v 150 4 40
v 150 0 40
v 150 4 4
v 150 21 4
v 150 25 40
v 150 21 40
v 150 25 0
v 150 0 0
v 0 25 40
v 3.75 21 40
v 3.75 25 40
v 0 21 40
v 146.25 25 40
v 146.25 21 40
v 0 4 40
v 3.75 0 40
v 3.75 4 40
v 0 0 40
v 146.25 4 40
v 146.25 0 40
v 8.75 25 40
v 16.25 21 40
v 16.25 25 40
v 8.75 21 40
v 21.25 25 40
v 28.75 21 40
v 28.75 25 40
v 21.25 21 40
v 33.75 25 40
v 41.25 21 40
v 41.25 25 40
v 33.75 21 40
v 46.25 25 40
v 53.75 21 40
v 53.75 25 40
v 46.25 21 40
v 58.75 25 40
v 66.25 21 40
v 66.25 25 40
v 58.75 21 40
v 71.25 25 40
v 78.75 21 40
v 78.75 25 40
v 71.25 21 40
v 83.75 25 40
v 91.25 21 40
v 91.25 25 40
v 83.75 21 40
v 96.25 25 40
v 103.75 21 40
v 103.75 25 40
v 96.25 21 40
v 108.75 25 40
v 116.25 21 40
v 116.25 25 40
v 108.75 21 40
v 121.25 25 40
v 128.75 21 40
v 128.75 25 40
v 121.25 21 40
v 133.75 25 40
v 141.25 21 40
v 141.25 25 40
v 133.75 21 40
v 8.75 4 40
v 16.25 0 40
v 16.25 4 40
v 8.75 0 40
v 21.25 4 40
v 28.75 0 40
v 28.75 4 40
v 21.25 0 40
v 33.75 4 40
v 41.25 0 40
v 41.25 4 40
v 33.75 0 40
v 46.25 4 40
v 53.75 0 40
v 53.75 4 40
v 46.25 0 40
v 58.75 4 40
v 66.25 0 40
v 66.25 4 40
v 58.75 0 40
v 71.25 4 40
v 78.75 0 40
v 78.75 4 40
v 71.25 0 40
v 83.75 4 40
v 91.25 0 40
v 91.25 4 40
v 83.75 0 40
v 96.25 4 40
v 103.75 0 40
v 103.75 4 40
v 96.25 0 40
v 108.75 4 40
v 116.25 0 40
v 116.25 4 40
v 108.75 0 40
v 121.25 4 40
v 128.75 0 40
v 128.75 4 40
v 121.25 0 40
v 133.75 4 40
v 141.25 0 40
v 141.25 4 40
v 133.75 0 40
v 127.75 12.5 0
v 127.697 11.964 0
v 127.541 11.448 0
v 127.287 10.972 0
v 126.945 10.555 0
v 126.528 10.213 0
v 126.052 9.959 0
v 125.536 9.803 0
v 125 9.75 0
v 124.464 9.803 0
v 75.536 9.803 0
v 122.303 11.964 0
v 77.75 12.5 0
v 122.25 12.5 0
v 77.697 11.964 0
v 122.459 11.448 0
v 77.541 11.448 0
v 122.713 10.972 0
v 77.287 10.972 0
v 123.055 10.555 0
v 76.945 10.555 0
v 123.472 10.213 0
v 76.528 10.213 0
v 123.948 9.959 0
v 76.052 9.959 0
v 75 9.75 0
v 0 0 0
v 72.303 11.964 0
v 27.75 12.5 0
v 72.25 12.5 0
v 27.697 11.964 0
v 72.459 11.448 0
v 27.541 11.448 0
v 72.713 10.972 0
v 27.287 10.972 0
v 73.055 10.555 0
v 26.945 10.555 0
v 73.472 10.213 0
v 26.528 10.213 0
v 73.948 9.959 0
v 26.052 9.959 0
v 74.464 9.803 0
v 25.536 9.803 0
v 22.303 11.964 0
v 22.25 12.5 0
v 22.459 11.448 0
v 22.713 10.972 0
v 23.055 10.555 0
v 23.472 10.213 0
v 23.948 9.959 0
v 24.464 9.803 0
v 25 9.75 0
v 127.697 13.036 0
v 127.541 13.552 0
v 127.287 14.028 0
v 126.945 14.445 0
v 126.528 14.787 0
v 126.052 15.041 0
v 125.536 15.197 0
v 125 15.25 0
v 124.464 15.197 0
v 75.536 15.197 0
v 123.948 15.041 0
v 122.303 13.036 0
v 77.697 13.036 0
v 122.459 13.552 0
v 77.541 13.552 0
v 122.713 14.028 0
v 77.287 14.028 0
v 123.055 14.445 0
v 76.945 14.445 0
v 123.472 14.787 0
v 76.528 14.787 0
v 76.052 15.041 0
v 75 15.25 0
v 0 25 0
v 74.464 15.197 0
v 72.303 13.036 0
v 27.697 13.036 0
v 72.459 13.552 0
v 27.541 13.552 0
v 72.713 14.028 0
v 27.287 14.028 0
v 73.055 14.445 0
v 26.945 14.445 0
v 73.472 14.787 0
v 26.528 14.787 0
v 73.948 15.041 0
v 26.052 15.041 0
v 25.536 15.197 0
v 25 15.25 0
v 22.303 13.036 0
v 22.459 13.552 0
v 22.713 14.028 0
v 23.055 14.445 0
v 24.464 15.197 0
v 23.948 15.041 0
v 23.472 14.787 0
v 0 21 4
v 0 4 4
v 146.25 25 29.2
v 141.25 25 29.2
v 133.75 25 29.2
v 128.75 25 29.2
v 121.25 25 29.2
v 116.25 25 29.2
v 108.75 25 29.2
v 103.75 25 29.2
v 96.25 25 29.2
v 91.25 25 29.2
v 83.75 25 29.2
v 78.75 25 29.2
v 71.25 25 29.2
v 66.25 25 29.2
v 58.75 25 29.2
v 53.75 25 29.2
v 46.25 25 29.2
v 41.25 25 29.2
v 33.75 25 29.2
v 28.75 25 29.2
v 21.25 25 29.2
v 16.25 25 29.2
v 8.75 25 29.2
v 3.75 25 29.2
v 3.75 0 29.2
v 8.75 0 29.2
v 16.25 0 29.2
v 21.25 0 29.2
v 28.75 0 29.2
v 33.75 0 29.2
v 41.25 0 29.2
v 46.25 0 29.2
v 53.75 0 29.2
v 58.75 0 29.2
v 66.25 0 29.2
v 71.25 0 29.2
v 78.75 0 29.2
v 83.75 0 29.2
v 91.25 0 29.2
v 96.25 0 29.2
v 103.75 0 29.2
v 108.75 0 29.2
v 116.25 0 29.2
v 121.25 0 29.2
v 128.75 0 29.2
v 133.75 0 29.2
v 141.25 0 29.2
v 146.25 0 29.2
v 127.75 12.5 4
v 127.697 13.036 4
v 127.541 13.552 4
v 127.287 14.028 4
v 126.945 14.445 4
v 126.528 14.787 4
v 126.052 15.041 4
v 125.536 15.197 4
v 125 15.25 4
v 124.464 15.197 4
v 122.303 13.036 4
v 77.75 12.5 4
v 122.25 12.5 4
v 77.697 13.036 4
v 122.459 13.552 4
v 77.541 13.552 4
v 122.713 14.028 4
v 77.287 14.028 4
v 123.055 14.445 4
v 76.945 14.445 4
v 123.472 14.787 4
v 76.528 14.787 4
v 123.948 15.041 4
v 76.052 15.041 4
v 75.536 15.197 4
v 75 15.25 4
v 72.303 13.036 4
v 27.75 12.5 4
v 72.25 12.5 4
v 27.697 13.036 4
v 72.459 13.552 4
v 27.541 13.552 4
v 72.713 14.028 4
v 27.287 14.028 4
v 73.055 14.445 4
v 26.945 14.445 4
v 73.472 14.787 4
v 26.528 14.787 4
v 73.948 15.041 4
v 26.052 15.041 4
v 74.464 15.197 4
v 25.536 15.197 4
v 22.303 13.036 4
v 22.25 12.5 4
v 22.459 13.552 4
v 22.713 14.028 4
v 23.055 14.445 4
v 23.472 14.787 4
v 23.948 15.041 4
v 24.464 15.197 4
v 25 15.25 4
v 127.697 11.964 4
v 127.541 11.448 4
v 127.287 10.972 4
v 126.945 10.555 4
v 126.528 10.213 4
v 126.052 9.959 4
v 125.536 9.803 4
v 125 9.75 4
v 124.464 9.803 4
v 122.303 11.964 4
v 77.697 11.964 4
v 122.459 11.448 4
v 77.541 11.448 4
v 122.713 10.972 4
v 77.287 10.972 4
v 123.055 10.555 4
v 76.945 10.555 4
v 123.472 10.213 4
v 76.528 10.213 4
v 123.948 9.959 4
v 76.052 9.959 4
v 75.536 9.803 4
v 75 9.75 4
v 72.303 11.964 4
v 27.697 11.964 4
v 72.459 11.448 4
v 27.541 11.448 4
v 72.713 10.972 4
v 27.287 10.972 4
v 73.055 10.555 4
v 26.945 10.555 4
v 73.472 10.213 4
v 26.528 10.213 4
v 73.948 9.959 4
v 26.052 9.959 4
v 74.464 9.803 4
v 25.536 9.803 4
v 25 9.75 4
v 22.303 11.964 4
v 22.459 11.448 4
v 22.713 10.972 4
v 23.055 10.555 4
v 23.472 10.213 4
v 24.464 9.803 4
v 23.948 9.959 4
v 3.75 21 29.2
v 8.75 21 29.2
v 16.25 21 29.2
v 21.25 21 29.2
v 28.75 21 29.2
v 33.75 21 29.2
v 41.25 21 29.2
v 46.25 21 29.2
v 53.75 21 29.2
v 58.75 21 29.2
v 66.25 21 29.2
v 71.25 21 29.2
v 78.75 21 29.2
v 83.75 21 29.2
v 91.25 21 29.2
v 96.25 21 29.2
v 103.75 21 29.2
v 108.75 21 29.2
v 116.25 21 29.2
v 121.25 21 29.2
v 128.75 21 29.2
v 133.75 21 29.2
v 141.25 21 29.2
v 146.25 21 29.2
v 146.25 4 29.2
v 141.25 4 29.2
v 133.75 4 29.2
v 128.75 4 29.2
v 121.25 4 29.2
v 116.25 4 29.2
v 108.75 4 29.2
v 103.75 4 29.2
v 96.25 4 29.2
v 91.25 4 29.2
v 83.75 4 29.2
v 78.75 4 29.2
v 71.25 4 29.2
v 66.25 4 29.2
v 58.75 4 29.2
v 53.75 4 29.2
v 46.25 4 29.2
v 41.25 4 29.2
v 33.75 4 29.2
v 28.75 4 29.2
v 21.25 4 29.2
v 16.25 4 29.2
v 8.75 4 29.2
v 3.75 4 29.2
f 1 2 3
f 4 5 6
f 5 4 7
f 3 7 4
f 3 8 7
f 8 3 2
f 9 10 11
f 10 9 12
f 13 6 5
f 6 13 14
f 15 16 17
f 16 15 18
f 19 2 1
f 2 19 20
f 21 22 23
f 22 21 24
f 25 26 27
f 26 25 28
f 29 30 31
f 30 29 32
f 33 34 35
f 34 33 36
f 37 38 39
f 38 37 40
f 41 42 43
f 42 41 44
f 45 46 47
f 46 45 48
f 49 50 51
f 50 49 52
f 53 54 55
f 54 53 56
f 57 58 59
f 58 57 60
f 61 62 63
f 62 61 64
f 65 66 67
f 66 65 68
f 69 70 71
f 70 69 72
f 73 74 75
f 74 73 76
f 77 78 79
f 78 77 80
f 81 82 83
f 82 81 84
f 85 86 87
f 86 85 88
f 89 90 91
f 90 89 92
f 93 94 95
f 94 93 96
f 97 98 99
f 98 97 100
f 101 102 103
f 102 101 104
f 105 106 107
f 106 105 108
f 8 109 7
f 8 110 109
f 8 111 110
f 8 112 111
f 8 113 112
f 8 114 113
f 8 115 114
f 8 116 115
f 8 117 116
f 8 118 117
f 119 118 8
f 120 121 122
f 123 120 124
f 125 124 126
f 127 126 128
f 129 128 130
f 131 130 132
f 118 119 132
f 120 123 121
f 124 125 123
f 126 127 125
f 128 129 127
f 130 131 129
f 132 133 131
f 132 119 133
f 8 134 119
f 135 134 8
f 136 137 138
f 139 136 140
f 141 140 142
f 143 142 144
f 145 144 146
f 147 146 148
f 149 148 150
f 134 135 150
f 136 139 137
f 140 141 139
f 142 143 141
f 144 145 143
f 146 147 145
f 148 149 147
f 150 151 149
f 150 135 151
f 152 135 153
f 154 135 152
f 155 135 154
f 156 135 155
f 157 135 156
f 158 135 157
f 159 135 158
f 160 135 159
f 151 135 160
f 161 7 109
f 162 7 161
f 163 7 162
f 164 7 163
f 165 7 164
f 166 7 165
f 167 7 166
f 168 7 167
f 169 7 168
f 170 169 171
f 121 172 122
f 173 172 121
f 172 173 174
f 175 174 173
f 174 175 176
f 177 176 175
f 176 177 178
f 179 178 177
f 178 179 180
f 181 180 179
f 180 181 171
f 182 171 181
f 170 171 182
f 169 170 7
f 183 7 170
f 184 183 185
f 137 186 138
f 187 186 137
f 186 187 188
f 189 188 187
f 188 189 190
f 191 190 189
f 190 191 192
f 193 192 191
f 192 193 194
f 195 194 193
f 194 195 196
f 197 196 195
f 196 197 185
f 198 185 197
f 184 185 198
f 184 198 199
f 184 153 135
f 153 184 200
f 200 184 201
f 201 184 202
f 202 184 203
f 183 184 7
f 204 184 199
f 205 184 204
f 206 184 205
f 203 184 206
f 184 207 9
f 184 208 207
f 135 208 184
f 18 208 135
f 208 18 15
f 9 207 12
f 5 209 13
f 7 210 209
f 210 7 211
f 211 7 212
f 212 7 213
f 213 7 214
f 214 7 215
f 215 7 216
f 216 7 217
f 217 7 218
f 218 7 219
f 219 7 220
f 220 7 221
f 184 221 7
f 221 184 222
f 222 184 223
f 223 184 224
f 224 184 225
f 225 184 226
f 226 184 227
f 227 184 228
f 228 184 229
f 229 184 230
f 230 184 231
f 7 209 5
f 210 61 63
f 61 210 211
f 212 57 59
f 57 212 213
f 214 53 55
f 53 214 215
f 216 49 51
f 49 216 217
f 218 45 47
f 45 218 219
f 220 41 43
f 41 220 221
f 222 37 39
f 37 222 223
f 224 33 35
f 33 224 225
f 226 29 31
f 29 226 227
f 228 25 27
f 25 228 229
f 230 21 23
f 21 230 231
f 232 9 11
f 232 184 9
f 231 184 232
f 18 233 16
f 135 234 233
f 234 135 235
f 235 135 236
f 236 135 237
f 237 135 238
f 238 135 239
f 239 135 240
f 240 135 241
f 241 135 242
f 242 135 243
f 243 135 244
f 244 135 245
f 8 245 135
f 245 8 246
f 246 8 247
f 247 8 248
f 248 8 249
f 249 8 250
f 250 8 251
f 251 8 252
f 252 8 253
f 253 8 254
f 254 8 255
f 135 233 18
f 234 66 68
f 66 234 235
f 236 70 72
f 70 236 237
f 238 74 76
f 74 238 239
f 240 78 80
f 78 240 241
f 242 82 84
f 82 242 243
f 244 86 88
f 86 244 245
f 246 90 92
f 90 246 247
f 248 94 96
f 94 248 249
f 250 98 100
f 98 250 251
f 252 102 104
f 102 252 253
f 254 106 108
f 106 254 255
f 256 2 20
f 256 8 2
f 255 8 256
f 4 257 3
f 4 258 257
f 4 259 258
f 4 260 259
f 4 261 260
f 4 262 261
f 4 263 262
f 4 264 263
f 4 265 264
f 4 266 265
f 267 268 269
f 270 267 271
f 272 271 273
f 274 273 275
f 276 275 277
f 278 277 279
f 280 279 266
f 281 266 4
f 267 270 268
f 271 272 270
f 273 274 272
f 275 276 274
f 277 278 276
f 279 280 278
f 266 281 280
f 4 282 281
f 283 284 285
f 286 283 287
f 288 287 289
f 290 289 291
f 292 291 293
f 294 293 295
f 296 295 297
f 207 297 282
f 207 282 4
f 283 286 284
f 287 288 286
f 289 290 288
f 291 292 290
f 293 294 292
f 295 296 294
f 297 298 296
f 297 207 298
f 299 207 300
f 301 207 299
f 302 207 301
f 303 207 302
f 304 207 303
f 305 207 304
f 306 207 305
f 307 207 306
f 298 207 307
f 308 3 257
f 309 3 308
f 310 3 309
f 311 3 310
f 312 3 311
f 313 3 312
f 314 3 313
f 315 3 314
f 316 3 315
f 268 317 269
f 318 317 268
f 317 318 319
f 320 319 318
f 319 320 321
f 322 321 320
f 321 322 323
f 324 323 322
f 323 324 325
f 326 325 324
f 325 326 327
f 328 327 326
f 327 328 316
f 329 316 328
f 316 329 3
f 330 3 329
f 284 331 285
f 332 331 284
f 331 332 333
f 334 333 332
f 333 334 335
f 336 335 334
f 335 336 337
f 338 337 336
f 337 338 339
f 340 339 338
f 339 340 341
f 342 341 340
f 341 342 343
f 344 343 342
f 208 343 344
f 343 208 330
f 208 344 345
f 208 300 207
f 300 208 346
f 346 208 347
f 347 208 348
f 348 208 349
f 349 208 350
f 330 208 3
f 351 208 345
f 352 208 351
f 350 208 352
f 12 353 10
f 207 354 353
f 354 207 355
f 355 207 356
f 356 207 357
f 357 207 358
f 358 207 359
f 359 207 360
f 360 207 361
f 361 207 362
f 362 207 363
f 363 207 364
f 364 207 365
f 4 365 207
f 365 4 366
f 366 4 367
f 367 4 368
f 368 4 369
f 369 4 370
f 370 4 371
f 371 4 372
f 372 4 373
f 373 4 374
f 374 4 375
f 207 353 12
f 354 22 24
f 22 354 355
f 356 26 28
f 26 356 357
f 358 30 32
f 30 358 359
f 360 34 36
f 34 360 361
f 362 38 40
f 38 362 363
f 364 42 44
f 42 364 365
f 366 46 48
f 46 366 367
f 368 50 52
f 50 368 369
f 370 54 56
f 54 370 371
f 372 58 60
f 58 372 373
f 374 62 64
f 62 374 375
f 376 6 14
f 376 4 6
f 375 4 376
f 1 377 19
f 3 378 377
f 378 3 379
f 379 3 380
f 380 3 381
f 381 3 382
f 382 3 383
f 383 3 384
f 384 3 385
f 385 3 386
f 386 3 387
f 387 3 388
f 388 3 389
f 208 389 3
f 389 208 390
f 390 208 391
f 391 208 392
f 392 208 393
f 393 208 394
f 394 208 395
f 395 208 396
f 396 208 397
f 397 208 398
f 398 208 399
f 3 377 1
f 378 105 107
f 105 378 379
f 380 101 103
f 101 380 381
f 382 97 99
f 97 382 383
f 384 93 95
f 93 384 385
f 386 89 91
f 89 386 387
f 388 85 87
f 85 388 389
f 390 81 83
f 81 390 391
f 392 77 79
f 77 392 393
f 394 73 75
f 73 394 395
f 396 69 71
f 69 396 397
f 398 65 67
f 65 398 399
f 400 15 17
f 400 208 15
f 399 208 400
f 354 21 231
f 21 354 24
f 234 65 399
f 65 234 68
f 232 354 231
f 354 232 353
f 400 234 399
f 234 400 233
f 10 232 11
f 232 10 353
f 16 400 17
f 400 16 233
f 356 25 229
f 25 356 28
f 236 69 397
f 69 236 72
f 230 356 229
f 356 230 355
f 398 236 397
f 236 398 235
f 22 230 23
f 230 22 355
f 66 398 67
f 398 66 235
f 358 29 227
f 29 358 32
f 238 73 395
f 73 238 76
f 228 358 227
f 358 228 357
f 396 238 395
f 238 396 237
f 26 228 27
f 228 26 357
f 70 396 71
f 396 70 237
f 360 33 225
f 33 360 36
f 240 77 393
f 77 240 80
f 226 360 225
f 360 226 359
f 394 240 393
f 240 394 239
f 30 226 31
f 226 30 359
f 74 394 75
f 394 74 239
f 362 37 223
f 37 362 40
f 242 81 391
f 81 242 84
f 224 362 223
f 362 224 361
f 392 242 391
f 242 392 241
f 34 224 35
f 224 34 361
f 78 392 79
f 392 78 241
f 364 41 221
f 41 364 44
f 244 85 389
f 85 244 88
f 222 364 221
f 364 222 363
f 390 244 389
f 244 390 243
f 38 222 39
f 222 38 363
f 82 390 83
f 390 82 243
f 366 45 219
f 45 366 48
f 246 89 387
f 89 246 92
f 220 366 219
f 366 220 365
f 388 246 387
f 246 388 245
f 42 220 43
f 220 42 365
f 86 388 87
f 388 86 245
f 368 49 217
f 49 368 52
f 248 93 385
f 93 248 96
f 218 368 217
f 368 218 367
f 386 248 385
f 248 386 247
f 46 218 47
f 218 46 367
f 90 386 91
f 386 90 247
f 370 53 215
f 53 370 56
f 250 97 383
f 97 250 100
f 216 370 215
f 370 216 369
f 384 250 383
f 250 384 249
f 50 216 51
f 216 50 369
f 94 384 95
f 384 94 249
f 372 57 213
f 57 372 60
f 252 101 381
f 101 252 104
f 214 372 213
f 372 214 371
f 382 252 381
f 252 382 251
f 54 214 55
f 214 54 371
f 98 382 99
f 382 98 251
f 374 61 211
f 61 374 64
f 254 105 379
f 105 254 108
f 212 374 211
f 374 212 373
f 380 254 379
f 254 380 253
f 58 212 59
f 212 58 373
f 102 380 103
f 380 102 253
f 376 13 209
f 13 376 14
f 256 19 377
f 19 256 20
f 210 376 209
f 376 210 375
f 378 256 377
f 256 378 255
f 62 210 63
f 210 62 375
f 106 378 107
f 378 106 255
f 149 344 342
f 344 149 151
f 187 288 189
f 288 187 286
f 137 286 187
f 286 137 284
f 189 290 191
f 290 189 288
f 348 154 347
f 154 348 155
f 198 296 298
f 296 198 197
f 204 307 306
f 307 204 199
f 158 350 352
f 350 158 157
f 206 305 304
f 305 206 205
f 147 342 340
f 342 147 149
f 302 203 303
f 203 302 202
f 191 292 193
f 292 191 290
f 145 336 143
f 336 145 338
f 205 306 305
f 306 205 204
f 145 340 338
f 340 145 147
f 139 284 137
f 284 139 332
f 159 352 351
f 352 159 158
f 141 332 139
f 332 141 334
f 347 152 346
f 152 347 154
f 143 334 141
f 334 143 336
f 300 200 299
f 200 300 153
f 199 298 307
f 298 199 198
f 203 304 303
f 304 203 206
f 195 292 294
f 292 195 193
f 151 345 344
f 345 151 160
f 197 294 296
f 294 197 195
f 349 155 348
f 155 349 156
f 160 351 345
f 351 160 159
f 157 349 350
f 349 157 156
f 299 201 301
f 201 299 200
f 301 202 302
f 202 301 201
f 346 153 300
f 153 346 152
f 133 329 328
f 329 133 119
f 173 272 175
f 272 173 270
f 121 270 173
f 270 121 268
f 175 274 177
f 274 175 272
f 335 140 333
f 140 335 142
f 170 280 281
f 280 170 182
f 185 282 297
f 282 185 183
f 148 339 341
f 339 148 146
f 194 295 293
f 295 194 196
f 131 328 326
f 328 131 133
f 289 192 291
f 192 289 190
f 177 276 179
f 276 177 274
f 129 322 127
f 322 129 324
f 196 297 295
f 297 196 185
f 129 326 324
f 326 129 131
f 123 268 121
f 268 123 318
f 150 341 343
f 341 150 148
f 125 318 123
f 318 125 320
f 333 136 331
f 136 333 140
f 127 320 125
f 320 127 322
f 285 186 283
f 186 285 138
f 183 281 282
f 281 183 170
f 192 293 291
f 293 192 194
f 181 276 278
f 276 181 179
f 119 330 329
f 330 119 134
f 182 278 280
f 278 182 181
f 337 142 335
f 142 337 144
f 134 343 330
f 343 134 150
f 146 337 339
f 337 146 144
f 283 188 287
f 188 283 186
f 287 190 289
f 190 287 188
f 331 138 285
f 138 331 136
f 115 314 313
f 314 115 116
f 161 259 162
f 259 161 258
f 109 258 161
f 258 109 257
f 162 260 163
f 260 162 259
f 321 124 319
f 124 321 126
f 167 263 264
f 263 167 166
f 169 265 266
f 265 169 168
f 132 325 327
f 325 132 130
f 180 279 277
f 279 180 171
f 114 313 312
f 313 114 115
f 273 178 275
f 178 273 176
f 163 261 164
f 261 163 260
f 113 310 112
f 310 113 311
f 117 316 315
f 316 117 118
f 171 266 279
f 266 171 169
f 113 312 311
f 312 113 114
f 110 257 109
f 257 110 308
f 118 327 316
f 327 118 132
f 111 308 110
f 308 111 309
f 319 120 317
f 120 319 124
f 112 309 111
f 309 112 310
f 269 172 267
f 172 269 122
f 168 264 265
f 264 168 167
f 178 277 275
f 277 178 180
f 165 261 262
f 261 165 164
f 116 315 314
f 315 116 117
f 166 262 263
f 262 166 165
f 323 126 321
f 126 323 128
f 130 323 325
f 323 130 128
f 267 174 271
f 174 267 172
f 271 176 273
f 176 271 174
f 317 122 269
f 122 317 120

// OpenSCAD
$fn = 32;

// ----------------------------------------------------------------------
// Cable duct: 150 x 25 x 40 mm, 12 fingers
// ----------------------------------------------------------------------

// --- parameters (mm) ---
tray_len = 150;           // duct length, X
tray_w = 25;              // duct width, Y
tray_h = 40;              // duct height, Z
tray_t = 4;               // side wall thickness
floor_t = 4;              // floor thickness
slot_w = 5;               // finger slot width
slot_h = 25.2;            // finger slot height
fingers = 12;             // number of finger slots per side
pitch = 12.5;             // finger pitch
hole_d = 5.5;             // floor mounting hole
hole_n = 3;               // mounting holes in the floor

module shell() {
  difference() {
    cube([tray_len, tray_w, tray_h]);
    /* open top channel */
    translate([-tray_t - 1, tray_t, floor_t])
      cube([tray_len + 2 * tray_t + 2, tray_w - 2 * tray_t, tray_h + 1]);
  }
}

difference() {
  union() {
    shell();
  }
  /* finger slots cut through both side walls */
  for (i = [0 : fingers - 1]) translate([pitch / 2 + i * pitch - slot_w / 2, -1, floor_t + slot_h]) cube([slot_w, tray_w + 2, tray_h]);
  for (i = [0 : hole_n - 1]) translate([(tray_len / hole_n) * (i + 0.5), tray_w / 2, -1]) cylinder(h = floor_t + 2, d = hole_d);
}
